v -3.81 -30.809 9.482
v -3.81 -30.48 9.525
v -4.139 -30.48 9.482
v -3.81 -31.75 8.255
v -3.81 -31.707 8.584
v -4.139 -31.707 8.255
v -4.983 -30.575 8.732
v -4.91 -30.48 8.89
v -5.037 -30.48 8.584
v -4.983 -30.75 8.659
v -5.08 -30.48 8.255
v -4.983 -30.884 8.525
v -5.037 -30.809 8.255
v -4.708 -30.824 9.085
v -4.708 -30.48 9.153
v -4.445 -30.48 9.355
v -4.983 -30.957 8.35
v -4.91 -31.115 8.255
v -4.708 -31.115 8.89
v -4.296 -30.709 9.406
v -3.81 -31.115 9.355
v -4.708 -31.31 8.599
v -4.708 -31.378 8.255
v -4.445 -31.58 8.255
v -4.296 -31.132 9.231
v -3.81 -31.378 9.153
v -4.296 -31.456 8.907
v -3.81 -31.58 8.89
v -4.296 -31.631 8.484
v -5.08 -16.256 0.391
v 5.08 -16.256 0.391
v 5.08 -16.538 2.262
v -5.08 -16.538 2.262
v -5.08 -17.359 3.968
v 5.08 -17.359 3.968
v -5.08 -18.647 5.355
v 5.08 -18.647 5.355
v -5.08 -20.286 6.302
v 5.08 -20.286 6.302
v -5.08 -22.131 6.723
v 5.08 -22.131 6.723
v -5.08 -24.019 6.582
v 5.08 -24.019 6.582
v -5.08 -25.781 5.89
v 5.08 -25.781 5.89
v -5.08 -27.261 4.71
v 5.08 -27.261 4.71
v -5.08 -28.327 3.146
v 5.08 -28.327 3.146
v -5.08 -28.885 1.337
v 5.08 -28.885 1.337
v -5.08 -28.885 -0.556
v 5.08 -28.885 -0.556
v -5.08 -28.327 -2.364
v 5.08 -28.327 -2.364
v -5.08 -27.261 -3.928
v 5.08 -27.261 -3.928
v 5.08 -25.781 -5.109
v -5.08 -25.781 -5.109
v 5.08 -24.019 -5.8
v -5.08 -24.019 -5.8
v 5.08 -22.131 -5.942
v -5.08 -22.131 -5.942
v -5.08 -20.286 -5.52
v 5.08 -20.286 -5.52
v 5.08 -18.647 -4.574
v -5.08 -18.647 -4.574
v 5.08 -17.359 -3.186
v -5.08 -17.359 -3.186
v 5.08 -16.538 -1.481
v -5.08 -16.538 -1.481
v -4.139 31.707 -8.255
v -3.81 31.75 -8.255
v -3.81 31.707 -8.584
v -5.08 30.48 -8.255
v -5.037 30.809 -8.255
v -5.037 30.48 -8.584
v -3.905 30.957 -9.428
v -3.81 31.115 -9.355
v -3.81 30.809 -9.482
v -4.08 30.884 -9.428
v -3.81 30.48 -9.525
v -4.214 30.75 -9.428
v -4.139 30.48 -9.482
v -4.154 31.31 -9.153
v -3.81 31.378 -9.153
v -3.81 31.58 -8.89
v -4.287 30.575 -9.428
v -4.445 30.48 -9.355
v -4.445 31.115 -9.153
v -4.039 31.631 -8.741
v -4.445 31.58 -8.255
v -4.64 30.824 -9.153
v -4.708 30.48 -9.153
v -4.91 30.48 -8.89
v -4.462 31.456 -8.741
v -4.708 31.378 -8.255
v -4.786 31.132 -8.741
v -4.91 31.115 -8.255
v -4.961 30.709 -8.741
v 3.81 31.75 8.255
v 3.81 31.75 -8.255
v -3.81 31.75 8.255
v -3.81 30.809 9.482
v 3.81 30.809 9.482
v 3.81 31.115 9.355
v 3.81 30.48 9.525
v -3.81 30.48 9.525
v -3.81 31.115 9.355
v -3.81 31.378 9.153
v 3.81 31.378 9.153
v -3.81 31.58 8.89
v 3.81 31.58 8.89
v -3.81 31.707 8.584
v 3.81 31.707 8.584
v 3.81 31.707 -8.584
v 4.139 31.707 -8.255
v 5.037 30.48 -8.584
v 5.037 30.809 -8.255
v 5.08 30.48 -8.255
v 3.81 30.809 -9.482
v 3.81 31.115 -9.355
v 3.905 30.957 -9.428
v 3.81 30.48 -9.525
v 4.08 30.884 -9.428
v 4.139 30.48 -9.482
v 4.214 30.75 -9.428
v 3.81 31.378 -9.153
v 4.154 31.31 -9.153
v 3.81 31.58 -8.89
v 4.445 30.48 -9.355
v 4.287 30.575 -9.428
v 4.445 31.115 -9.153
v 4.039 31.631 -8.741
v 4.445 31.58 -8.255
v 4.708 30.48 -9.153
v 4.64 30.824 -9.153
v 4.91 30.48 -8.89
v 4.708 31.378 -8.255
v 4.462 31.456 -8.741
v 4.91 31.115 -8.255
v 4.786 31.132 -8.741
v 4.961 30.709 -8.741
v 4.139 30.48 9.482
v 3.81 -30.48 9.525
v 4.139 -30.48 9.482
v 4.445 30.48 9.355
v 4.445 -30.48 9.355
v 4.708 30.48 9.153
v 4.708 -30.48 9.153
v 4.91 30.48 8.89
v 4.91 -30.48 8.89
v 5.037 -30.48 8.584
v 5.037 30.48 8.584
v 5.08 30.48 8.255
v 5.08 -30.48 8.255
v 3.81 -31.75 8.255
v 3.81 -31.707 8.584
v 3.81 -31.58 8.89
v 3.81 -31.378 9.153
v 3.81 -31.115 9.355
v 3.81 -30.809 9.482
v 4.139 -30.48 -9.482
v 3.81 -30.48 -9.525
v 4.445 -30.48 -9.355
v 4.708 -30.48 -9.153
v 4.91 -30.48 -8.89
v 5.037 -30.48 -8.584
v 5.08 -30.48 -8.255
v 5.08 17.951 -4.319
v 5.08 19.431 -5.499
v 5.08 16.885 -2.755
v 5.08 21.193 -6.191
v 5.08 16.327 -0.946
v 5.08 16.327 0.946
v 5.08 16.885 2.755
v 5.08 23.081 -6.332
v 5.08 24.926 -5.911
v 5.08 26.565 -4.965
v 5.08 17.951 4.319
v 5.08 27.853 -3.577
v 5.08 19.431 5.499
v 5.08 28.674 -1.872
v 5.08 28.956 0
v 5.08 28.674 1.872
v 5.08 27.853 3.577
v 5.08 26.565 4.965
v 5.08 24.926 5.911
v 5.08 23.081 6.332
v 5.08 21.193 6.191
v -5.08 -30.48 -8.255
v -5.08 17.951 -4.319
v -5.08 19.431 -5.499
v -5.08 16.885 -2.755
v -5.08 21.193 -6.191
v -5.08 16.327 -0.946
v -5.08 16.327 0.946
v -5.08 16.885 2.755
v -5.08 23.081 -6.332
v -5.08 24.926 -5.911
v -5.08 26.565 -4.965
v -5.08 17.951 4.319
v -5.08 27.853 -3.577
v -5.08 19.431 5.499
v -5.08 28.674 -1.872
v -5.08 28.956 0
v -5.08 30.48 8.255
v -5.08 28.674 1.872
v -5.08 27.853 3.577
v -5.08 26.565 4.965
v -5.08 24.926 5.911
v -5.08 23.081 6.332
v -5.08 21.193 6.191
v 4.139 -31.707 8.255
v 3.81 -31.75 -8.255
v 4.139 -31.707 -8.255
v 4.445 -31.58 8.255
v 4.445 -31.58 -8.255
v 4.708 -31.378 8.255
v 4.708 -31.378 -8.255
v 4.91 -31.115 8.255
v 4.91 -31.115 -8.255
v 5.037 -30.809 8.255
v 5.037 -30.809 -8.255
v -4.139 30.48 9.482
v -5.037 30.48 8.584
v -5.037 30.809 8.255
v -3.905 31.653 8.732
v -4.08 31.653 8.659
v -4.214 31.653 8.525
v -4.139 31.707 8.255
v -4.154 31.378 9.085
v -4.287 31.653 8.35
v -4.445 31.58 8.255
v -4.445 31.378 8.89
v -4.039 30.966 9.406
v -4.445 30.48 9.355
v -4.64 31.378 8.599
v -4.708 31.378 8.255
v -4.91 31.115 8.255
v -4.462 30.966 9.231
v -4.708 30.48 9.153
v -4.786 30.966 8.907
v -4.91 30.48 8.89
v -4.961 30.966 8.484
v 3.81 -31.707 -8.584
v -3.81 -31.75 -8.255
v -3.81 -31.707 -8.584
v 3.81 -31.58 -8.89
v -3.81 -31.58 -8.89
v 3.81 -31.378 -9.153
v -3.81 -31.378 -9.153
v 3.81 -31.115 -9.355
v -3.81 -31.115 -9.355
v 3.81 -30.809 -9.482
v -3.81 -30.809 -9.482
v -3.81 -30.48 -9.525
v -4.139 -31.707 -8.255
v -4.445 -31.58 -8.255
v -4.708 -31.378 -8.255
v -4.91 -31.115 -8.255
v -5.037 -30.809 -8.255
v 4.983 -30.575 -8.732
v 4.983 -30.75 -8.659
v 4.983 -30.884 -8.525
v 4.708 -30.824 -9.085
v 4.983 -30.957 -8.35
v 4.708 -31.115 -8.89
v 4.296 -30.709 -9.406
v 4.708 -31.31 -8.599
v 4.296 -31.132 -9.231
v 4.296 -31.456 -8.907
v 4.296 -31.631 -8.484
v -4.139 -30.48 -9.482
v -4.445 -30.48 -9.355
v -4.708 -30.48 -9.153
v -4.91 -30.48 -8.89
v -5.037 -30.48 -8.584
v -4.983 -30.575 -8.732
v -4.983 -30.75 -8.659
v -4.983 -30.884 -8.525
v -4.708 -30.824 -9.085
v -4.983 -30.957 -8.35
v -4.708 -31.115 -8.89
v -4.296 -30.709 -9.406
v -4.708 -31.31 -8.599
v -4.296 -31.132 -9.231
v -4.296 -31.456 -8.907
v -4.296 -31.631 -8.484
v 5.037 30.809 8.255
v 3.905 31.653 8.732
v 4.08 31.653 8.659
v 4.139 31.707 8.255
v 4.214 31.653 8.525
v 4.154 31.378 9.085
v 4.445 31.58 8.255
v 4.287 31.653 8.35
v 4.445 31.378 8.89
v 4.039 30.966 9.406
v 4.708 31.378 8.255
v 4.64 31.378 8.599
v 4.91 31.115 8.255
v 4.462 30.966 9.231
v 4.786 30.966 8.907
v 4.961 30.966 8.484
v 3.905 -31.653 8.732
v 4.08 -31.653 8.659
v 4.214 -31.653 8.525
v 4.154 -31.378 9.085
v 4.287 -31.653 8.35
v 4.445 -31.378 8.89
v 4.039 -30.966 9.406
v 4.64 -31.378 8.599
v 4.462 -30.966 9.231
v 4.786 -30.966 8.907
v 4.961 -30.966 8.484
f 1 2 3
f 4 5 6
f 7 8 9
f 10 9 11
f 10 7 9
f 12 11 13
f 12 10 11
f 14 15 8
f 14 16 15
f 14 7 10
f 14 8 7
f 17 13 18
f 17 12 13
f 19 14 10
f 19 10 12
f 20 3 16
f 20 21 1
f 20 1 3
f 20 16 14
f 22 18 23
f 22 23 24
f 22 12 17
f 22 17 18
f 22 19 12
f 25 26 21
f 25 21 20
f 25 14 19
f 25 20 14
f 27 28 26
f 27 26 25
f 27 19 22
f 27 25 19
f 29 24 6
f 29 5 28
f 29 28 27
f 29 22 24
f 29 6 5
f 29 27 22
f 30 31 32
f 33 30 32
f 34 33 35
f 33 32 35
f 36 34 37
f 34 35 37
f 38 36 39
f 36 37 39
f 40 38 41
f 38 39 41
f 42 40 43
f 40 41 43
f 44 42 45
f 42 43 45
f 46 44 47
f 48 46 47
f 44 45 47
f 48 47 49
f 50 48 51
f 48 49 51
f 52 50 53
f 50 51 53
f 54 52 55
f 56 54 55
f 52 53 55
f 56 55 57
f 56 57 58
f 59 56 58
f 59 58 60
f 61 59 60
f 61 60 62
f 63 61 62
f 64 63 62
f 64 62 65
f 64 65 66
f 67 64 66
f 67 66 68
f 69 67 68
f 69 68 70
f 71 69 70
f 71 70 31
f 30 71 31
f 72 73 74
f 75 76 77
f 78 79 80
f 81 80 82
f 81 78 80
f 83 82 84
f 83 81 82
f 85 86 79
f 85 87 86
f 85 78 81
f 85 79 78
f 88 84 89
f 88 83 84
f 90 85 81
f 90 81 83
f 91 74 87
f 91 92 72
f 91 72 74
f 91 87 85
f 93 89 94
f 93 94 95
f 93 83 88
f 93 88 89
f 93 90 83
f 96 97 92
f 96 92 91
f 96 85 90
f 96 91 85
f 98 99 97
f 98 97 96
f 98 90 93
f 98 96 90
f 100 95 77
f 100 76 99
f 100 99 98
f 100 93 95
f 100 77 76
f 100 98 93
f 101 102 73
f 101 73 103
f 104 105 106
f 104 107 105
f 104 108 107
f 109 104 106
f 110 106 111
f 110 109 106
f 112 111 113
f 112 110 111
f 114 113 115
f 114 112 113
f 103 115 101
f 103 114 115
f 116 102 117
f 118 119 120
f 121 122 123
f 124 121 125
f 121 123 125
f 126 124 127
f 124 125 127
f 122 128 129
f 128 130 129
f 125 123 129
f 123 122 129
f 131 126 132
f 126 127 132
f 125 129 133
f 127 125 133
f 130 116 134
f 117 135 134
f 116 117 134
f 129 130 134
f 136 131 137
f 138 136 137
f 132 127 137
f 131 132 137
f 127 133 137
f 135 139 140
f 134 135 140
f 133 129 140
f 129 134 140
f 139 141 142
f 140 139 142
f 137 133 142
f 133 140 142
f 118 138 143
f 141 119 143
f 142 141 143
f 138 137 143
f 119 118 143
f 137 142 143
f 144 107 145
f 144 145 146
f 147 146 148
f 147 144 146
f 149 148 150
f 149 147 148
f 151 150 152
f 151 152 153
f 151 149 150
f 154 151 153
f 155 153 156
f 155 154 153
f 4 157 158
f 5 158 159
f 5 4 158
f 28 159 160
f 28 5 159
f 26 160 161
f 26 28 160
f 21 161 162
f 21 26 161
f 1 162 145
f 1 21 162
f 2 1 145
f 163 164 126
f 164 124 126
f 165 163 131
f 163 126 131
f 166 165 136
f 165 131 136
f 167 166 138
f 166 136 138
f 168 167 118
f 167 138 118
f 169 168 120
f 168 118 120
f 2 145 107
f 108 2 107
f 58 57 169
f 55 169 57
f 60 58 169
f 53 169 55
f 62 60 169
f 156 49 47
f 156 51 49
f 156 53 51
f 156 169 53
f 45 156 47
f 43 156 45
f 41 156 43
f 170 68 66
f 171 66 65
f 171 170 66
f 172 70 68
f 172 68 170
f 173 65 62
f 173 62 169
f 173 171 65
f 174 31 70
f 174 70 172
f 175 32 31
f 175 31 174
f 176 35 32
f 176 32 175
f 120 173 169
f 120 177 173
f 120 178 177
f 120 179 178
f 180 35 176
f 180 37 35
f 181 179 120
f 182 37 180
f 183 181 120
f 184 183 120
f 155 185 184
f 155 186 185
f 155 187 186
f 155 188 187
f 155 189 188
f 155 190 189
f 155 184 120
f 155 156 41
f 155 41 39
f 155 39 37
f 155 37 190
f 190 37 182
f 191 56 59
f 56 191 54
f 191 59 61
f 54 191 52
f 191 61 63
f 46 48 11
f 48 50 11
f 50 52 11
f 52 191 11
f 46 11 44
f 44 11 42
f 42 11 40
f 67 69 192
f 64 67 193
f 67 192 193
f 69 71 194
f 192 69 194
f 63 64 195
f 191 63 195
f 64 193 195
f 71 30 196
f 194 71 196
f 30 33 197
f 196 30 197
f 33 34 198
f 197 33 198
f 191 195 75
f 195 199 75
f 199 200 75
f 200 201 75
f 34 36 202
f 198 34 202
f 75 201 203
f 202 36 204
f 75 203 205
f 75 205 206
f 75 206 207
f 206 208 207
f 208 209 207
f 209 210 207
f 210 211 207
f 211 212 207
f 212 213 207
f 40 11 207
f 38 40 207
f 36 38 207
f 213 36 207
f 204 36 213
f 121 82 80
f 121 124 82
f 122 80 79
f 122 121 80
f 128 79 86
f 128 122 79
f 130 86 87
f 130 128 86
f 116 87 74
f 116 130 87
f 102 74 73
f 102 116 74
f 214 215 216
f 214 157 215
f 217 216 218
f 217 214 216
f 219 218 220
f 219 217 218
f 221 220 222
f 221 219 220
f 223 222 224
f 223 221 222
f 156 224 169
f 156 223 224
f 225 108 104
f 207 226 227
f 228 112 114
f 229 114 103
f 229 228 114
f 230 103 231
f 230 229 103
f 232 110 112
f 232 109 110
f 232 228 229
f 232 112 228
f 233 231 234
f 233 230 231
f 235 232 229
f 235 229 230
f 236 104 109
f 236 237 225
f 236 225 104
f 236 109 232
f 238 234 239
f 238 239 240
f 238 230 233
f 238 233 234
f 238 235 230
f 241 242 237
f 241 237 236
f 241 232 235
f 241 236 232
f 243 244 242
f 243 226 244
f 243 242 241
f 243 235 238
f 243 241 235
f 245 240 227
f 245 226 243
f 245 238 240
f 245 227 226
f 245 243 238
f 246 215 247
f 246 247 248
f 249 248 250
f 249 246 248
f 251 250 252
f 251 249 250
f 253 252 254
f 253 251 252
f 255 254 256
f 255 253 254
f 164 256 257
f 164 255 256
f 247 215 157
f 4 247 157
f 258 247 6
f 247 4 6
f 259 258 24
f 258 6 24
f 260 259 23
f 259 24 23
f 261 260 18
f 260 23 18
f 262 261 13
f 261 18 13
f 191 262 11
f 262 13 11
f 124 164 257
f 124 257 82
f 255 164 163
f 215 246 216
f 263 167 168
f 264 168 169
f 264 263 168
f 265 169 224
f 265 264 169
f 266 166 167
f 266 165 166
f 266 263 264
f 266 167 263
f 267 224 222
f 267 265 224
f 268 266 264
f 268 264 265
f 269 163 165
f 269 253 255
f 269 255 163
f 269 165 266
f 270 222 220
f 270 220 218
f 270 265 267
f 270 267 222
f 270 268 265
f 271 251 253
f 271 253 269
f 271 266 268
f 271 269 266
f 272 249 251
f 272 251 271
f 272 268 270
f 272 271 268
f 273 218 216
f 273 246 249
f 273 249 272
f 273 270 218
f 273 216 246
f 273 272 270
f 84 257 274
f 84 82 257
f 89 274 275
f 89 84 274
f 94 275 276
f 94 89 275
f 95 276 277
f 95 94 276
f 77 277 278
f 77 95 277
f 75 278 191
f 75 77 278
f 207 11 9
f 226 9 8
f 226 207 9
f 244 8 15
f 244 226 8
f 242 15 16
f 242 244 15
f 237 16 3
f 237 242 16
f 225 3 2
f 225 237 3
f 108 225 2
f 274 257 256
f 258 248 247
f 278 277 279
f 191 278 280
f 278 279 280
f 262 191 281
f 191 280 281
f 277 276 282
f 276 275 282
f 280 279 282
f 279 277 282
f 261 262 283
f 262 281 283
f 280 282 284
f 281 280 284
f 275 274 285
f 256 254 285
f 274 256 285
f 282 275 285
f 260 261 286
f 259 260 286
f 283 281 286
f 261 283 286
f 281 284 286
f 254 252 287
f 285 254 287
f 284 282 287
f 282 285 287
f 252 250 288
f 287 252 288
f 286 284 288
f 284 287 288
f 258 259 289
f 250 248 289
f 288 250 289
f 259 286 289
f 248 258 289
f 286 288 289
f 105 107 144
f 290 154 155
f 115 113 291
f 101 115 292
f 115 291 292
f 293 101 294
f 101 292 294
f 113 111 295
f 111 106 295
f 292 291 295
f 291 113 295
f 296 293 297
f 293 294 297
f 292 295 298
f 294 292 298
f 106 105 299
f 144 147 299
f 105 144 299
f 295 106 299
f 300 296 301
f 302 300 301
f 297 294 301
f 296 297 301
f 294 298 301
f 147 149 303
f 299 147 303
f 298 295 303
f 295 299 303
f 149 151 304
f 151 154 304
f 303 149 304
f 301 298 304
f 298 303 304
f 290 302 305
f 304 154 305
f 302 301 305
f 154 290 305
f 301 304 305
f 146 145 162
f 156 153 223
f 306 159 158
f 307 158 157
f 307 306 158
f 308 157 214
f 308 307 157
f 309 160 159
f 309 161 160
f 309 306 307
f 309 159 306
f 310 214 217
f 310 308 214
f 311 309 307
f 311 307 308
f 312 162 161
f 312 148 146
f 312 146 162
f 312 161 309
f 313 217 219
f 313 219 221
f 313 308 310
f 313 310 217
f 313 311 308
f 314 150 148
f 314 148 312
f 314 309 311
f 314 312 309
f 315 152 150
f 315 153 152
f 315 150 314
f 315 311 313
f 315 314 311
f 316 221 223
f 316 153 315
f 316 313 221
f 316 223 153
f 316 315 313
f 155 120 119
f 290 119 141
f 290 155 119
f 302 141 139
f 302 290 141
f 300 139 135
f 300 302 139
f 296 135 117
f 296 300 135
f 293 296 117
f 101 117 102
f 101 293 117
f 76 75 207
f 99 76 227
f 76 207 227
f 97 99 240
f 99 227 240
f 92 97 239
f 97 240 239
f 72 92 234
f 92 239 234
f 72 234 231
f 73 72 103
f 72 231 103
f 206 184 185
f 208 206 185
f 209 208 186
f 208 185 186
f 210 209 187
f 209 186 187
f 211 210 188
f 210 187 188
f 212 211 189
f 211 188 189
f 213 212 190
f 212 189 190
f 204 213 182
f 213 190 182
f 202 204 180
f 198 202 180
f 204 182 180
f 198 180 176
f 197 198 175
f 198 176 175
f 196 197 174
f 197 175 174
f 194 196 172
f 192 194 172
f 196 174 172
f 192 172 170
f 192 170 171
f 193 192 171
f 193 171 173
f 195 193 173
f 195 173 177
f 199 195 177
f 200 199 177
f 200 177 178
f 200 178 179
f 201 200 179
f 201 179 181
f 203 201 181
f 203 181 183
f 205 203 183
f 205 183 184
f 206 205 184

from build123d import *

# Parameters (mm, degrees)
F0_W          = 63.5
F0_H          = 19.05
F1_DEPTH      = 5.08
F1_DEPTH_BACK = 5.08
F2_R          = 6.35
F3_DEPTH      = 25.4
F4_R          = 1.27


with BuildPart() as f1:
    # F0 (on Right) → F1 (new body, two sides)
    with BuildSketch(Plane.YZ) as f1_sk:
        Rectangle(F0_W, F0_H)
    extrude(amount=F1_DEPTH)
    extrude(f1_sk.sketch, amount=-F1_DEPTH_BACK)

    # F2 (on face) → F3 (cut)
    with BuildSketch(Plane.YZ.offset(5.08)):
        with Locations((22.606, 0)):
            Circle(F2_R)
        with Locations((-22.606, 0.390719)):
            Circle(F2_R)
    extrude(amount=-F3_DEPTH, mode=Mode.SUBTRACT)

    # F4
    f4_edges = [f1.edges().sort_by_distance(p)[0] for p in [
        (5.08, 0, 9.525),
        (0, -31.75, 9.525),
        (-5.08, 0, 9.525),
        (0, 31.75, 9.525),
        (5.08, 31.75, 0),
        (-5.08, 31.75, 0),
        (0, 31.75, -9.525),
        (0, -31.75, -9.525),
        (5.08, 0, -9.525),
        (-5.08, 0, -9.525),
        (5.08, -31.75, 0),
        (-5.08, -31.75, 0),
    ]]
    fillet(f4_edges, radius=F4_R)


solid = f1.part
